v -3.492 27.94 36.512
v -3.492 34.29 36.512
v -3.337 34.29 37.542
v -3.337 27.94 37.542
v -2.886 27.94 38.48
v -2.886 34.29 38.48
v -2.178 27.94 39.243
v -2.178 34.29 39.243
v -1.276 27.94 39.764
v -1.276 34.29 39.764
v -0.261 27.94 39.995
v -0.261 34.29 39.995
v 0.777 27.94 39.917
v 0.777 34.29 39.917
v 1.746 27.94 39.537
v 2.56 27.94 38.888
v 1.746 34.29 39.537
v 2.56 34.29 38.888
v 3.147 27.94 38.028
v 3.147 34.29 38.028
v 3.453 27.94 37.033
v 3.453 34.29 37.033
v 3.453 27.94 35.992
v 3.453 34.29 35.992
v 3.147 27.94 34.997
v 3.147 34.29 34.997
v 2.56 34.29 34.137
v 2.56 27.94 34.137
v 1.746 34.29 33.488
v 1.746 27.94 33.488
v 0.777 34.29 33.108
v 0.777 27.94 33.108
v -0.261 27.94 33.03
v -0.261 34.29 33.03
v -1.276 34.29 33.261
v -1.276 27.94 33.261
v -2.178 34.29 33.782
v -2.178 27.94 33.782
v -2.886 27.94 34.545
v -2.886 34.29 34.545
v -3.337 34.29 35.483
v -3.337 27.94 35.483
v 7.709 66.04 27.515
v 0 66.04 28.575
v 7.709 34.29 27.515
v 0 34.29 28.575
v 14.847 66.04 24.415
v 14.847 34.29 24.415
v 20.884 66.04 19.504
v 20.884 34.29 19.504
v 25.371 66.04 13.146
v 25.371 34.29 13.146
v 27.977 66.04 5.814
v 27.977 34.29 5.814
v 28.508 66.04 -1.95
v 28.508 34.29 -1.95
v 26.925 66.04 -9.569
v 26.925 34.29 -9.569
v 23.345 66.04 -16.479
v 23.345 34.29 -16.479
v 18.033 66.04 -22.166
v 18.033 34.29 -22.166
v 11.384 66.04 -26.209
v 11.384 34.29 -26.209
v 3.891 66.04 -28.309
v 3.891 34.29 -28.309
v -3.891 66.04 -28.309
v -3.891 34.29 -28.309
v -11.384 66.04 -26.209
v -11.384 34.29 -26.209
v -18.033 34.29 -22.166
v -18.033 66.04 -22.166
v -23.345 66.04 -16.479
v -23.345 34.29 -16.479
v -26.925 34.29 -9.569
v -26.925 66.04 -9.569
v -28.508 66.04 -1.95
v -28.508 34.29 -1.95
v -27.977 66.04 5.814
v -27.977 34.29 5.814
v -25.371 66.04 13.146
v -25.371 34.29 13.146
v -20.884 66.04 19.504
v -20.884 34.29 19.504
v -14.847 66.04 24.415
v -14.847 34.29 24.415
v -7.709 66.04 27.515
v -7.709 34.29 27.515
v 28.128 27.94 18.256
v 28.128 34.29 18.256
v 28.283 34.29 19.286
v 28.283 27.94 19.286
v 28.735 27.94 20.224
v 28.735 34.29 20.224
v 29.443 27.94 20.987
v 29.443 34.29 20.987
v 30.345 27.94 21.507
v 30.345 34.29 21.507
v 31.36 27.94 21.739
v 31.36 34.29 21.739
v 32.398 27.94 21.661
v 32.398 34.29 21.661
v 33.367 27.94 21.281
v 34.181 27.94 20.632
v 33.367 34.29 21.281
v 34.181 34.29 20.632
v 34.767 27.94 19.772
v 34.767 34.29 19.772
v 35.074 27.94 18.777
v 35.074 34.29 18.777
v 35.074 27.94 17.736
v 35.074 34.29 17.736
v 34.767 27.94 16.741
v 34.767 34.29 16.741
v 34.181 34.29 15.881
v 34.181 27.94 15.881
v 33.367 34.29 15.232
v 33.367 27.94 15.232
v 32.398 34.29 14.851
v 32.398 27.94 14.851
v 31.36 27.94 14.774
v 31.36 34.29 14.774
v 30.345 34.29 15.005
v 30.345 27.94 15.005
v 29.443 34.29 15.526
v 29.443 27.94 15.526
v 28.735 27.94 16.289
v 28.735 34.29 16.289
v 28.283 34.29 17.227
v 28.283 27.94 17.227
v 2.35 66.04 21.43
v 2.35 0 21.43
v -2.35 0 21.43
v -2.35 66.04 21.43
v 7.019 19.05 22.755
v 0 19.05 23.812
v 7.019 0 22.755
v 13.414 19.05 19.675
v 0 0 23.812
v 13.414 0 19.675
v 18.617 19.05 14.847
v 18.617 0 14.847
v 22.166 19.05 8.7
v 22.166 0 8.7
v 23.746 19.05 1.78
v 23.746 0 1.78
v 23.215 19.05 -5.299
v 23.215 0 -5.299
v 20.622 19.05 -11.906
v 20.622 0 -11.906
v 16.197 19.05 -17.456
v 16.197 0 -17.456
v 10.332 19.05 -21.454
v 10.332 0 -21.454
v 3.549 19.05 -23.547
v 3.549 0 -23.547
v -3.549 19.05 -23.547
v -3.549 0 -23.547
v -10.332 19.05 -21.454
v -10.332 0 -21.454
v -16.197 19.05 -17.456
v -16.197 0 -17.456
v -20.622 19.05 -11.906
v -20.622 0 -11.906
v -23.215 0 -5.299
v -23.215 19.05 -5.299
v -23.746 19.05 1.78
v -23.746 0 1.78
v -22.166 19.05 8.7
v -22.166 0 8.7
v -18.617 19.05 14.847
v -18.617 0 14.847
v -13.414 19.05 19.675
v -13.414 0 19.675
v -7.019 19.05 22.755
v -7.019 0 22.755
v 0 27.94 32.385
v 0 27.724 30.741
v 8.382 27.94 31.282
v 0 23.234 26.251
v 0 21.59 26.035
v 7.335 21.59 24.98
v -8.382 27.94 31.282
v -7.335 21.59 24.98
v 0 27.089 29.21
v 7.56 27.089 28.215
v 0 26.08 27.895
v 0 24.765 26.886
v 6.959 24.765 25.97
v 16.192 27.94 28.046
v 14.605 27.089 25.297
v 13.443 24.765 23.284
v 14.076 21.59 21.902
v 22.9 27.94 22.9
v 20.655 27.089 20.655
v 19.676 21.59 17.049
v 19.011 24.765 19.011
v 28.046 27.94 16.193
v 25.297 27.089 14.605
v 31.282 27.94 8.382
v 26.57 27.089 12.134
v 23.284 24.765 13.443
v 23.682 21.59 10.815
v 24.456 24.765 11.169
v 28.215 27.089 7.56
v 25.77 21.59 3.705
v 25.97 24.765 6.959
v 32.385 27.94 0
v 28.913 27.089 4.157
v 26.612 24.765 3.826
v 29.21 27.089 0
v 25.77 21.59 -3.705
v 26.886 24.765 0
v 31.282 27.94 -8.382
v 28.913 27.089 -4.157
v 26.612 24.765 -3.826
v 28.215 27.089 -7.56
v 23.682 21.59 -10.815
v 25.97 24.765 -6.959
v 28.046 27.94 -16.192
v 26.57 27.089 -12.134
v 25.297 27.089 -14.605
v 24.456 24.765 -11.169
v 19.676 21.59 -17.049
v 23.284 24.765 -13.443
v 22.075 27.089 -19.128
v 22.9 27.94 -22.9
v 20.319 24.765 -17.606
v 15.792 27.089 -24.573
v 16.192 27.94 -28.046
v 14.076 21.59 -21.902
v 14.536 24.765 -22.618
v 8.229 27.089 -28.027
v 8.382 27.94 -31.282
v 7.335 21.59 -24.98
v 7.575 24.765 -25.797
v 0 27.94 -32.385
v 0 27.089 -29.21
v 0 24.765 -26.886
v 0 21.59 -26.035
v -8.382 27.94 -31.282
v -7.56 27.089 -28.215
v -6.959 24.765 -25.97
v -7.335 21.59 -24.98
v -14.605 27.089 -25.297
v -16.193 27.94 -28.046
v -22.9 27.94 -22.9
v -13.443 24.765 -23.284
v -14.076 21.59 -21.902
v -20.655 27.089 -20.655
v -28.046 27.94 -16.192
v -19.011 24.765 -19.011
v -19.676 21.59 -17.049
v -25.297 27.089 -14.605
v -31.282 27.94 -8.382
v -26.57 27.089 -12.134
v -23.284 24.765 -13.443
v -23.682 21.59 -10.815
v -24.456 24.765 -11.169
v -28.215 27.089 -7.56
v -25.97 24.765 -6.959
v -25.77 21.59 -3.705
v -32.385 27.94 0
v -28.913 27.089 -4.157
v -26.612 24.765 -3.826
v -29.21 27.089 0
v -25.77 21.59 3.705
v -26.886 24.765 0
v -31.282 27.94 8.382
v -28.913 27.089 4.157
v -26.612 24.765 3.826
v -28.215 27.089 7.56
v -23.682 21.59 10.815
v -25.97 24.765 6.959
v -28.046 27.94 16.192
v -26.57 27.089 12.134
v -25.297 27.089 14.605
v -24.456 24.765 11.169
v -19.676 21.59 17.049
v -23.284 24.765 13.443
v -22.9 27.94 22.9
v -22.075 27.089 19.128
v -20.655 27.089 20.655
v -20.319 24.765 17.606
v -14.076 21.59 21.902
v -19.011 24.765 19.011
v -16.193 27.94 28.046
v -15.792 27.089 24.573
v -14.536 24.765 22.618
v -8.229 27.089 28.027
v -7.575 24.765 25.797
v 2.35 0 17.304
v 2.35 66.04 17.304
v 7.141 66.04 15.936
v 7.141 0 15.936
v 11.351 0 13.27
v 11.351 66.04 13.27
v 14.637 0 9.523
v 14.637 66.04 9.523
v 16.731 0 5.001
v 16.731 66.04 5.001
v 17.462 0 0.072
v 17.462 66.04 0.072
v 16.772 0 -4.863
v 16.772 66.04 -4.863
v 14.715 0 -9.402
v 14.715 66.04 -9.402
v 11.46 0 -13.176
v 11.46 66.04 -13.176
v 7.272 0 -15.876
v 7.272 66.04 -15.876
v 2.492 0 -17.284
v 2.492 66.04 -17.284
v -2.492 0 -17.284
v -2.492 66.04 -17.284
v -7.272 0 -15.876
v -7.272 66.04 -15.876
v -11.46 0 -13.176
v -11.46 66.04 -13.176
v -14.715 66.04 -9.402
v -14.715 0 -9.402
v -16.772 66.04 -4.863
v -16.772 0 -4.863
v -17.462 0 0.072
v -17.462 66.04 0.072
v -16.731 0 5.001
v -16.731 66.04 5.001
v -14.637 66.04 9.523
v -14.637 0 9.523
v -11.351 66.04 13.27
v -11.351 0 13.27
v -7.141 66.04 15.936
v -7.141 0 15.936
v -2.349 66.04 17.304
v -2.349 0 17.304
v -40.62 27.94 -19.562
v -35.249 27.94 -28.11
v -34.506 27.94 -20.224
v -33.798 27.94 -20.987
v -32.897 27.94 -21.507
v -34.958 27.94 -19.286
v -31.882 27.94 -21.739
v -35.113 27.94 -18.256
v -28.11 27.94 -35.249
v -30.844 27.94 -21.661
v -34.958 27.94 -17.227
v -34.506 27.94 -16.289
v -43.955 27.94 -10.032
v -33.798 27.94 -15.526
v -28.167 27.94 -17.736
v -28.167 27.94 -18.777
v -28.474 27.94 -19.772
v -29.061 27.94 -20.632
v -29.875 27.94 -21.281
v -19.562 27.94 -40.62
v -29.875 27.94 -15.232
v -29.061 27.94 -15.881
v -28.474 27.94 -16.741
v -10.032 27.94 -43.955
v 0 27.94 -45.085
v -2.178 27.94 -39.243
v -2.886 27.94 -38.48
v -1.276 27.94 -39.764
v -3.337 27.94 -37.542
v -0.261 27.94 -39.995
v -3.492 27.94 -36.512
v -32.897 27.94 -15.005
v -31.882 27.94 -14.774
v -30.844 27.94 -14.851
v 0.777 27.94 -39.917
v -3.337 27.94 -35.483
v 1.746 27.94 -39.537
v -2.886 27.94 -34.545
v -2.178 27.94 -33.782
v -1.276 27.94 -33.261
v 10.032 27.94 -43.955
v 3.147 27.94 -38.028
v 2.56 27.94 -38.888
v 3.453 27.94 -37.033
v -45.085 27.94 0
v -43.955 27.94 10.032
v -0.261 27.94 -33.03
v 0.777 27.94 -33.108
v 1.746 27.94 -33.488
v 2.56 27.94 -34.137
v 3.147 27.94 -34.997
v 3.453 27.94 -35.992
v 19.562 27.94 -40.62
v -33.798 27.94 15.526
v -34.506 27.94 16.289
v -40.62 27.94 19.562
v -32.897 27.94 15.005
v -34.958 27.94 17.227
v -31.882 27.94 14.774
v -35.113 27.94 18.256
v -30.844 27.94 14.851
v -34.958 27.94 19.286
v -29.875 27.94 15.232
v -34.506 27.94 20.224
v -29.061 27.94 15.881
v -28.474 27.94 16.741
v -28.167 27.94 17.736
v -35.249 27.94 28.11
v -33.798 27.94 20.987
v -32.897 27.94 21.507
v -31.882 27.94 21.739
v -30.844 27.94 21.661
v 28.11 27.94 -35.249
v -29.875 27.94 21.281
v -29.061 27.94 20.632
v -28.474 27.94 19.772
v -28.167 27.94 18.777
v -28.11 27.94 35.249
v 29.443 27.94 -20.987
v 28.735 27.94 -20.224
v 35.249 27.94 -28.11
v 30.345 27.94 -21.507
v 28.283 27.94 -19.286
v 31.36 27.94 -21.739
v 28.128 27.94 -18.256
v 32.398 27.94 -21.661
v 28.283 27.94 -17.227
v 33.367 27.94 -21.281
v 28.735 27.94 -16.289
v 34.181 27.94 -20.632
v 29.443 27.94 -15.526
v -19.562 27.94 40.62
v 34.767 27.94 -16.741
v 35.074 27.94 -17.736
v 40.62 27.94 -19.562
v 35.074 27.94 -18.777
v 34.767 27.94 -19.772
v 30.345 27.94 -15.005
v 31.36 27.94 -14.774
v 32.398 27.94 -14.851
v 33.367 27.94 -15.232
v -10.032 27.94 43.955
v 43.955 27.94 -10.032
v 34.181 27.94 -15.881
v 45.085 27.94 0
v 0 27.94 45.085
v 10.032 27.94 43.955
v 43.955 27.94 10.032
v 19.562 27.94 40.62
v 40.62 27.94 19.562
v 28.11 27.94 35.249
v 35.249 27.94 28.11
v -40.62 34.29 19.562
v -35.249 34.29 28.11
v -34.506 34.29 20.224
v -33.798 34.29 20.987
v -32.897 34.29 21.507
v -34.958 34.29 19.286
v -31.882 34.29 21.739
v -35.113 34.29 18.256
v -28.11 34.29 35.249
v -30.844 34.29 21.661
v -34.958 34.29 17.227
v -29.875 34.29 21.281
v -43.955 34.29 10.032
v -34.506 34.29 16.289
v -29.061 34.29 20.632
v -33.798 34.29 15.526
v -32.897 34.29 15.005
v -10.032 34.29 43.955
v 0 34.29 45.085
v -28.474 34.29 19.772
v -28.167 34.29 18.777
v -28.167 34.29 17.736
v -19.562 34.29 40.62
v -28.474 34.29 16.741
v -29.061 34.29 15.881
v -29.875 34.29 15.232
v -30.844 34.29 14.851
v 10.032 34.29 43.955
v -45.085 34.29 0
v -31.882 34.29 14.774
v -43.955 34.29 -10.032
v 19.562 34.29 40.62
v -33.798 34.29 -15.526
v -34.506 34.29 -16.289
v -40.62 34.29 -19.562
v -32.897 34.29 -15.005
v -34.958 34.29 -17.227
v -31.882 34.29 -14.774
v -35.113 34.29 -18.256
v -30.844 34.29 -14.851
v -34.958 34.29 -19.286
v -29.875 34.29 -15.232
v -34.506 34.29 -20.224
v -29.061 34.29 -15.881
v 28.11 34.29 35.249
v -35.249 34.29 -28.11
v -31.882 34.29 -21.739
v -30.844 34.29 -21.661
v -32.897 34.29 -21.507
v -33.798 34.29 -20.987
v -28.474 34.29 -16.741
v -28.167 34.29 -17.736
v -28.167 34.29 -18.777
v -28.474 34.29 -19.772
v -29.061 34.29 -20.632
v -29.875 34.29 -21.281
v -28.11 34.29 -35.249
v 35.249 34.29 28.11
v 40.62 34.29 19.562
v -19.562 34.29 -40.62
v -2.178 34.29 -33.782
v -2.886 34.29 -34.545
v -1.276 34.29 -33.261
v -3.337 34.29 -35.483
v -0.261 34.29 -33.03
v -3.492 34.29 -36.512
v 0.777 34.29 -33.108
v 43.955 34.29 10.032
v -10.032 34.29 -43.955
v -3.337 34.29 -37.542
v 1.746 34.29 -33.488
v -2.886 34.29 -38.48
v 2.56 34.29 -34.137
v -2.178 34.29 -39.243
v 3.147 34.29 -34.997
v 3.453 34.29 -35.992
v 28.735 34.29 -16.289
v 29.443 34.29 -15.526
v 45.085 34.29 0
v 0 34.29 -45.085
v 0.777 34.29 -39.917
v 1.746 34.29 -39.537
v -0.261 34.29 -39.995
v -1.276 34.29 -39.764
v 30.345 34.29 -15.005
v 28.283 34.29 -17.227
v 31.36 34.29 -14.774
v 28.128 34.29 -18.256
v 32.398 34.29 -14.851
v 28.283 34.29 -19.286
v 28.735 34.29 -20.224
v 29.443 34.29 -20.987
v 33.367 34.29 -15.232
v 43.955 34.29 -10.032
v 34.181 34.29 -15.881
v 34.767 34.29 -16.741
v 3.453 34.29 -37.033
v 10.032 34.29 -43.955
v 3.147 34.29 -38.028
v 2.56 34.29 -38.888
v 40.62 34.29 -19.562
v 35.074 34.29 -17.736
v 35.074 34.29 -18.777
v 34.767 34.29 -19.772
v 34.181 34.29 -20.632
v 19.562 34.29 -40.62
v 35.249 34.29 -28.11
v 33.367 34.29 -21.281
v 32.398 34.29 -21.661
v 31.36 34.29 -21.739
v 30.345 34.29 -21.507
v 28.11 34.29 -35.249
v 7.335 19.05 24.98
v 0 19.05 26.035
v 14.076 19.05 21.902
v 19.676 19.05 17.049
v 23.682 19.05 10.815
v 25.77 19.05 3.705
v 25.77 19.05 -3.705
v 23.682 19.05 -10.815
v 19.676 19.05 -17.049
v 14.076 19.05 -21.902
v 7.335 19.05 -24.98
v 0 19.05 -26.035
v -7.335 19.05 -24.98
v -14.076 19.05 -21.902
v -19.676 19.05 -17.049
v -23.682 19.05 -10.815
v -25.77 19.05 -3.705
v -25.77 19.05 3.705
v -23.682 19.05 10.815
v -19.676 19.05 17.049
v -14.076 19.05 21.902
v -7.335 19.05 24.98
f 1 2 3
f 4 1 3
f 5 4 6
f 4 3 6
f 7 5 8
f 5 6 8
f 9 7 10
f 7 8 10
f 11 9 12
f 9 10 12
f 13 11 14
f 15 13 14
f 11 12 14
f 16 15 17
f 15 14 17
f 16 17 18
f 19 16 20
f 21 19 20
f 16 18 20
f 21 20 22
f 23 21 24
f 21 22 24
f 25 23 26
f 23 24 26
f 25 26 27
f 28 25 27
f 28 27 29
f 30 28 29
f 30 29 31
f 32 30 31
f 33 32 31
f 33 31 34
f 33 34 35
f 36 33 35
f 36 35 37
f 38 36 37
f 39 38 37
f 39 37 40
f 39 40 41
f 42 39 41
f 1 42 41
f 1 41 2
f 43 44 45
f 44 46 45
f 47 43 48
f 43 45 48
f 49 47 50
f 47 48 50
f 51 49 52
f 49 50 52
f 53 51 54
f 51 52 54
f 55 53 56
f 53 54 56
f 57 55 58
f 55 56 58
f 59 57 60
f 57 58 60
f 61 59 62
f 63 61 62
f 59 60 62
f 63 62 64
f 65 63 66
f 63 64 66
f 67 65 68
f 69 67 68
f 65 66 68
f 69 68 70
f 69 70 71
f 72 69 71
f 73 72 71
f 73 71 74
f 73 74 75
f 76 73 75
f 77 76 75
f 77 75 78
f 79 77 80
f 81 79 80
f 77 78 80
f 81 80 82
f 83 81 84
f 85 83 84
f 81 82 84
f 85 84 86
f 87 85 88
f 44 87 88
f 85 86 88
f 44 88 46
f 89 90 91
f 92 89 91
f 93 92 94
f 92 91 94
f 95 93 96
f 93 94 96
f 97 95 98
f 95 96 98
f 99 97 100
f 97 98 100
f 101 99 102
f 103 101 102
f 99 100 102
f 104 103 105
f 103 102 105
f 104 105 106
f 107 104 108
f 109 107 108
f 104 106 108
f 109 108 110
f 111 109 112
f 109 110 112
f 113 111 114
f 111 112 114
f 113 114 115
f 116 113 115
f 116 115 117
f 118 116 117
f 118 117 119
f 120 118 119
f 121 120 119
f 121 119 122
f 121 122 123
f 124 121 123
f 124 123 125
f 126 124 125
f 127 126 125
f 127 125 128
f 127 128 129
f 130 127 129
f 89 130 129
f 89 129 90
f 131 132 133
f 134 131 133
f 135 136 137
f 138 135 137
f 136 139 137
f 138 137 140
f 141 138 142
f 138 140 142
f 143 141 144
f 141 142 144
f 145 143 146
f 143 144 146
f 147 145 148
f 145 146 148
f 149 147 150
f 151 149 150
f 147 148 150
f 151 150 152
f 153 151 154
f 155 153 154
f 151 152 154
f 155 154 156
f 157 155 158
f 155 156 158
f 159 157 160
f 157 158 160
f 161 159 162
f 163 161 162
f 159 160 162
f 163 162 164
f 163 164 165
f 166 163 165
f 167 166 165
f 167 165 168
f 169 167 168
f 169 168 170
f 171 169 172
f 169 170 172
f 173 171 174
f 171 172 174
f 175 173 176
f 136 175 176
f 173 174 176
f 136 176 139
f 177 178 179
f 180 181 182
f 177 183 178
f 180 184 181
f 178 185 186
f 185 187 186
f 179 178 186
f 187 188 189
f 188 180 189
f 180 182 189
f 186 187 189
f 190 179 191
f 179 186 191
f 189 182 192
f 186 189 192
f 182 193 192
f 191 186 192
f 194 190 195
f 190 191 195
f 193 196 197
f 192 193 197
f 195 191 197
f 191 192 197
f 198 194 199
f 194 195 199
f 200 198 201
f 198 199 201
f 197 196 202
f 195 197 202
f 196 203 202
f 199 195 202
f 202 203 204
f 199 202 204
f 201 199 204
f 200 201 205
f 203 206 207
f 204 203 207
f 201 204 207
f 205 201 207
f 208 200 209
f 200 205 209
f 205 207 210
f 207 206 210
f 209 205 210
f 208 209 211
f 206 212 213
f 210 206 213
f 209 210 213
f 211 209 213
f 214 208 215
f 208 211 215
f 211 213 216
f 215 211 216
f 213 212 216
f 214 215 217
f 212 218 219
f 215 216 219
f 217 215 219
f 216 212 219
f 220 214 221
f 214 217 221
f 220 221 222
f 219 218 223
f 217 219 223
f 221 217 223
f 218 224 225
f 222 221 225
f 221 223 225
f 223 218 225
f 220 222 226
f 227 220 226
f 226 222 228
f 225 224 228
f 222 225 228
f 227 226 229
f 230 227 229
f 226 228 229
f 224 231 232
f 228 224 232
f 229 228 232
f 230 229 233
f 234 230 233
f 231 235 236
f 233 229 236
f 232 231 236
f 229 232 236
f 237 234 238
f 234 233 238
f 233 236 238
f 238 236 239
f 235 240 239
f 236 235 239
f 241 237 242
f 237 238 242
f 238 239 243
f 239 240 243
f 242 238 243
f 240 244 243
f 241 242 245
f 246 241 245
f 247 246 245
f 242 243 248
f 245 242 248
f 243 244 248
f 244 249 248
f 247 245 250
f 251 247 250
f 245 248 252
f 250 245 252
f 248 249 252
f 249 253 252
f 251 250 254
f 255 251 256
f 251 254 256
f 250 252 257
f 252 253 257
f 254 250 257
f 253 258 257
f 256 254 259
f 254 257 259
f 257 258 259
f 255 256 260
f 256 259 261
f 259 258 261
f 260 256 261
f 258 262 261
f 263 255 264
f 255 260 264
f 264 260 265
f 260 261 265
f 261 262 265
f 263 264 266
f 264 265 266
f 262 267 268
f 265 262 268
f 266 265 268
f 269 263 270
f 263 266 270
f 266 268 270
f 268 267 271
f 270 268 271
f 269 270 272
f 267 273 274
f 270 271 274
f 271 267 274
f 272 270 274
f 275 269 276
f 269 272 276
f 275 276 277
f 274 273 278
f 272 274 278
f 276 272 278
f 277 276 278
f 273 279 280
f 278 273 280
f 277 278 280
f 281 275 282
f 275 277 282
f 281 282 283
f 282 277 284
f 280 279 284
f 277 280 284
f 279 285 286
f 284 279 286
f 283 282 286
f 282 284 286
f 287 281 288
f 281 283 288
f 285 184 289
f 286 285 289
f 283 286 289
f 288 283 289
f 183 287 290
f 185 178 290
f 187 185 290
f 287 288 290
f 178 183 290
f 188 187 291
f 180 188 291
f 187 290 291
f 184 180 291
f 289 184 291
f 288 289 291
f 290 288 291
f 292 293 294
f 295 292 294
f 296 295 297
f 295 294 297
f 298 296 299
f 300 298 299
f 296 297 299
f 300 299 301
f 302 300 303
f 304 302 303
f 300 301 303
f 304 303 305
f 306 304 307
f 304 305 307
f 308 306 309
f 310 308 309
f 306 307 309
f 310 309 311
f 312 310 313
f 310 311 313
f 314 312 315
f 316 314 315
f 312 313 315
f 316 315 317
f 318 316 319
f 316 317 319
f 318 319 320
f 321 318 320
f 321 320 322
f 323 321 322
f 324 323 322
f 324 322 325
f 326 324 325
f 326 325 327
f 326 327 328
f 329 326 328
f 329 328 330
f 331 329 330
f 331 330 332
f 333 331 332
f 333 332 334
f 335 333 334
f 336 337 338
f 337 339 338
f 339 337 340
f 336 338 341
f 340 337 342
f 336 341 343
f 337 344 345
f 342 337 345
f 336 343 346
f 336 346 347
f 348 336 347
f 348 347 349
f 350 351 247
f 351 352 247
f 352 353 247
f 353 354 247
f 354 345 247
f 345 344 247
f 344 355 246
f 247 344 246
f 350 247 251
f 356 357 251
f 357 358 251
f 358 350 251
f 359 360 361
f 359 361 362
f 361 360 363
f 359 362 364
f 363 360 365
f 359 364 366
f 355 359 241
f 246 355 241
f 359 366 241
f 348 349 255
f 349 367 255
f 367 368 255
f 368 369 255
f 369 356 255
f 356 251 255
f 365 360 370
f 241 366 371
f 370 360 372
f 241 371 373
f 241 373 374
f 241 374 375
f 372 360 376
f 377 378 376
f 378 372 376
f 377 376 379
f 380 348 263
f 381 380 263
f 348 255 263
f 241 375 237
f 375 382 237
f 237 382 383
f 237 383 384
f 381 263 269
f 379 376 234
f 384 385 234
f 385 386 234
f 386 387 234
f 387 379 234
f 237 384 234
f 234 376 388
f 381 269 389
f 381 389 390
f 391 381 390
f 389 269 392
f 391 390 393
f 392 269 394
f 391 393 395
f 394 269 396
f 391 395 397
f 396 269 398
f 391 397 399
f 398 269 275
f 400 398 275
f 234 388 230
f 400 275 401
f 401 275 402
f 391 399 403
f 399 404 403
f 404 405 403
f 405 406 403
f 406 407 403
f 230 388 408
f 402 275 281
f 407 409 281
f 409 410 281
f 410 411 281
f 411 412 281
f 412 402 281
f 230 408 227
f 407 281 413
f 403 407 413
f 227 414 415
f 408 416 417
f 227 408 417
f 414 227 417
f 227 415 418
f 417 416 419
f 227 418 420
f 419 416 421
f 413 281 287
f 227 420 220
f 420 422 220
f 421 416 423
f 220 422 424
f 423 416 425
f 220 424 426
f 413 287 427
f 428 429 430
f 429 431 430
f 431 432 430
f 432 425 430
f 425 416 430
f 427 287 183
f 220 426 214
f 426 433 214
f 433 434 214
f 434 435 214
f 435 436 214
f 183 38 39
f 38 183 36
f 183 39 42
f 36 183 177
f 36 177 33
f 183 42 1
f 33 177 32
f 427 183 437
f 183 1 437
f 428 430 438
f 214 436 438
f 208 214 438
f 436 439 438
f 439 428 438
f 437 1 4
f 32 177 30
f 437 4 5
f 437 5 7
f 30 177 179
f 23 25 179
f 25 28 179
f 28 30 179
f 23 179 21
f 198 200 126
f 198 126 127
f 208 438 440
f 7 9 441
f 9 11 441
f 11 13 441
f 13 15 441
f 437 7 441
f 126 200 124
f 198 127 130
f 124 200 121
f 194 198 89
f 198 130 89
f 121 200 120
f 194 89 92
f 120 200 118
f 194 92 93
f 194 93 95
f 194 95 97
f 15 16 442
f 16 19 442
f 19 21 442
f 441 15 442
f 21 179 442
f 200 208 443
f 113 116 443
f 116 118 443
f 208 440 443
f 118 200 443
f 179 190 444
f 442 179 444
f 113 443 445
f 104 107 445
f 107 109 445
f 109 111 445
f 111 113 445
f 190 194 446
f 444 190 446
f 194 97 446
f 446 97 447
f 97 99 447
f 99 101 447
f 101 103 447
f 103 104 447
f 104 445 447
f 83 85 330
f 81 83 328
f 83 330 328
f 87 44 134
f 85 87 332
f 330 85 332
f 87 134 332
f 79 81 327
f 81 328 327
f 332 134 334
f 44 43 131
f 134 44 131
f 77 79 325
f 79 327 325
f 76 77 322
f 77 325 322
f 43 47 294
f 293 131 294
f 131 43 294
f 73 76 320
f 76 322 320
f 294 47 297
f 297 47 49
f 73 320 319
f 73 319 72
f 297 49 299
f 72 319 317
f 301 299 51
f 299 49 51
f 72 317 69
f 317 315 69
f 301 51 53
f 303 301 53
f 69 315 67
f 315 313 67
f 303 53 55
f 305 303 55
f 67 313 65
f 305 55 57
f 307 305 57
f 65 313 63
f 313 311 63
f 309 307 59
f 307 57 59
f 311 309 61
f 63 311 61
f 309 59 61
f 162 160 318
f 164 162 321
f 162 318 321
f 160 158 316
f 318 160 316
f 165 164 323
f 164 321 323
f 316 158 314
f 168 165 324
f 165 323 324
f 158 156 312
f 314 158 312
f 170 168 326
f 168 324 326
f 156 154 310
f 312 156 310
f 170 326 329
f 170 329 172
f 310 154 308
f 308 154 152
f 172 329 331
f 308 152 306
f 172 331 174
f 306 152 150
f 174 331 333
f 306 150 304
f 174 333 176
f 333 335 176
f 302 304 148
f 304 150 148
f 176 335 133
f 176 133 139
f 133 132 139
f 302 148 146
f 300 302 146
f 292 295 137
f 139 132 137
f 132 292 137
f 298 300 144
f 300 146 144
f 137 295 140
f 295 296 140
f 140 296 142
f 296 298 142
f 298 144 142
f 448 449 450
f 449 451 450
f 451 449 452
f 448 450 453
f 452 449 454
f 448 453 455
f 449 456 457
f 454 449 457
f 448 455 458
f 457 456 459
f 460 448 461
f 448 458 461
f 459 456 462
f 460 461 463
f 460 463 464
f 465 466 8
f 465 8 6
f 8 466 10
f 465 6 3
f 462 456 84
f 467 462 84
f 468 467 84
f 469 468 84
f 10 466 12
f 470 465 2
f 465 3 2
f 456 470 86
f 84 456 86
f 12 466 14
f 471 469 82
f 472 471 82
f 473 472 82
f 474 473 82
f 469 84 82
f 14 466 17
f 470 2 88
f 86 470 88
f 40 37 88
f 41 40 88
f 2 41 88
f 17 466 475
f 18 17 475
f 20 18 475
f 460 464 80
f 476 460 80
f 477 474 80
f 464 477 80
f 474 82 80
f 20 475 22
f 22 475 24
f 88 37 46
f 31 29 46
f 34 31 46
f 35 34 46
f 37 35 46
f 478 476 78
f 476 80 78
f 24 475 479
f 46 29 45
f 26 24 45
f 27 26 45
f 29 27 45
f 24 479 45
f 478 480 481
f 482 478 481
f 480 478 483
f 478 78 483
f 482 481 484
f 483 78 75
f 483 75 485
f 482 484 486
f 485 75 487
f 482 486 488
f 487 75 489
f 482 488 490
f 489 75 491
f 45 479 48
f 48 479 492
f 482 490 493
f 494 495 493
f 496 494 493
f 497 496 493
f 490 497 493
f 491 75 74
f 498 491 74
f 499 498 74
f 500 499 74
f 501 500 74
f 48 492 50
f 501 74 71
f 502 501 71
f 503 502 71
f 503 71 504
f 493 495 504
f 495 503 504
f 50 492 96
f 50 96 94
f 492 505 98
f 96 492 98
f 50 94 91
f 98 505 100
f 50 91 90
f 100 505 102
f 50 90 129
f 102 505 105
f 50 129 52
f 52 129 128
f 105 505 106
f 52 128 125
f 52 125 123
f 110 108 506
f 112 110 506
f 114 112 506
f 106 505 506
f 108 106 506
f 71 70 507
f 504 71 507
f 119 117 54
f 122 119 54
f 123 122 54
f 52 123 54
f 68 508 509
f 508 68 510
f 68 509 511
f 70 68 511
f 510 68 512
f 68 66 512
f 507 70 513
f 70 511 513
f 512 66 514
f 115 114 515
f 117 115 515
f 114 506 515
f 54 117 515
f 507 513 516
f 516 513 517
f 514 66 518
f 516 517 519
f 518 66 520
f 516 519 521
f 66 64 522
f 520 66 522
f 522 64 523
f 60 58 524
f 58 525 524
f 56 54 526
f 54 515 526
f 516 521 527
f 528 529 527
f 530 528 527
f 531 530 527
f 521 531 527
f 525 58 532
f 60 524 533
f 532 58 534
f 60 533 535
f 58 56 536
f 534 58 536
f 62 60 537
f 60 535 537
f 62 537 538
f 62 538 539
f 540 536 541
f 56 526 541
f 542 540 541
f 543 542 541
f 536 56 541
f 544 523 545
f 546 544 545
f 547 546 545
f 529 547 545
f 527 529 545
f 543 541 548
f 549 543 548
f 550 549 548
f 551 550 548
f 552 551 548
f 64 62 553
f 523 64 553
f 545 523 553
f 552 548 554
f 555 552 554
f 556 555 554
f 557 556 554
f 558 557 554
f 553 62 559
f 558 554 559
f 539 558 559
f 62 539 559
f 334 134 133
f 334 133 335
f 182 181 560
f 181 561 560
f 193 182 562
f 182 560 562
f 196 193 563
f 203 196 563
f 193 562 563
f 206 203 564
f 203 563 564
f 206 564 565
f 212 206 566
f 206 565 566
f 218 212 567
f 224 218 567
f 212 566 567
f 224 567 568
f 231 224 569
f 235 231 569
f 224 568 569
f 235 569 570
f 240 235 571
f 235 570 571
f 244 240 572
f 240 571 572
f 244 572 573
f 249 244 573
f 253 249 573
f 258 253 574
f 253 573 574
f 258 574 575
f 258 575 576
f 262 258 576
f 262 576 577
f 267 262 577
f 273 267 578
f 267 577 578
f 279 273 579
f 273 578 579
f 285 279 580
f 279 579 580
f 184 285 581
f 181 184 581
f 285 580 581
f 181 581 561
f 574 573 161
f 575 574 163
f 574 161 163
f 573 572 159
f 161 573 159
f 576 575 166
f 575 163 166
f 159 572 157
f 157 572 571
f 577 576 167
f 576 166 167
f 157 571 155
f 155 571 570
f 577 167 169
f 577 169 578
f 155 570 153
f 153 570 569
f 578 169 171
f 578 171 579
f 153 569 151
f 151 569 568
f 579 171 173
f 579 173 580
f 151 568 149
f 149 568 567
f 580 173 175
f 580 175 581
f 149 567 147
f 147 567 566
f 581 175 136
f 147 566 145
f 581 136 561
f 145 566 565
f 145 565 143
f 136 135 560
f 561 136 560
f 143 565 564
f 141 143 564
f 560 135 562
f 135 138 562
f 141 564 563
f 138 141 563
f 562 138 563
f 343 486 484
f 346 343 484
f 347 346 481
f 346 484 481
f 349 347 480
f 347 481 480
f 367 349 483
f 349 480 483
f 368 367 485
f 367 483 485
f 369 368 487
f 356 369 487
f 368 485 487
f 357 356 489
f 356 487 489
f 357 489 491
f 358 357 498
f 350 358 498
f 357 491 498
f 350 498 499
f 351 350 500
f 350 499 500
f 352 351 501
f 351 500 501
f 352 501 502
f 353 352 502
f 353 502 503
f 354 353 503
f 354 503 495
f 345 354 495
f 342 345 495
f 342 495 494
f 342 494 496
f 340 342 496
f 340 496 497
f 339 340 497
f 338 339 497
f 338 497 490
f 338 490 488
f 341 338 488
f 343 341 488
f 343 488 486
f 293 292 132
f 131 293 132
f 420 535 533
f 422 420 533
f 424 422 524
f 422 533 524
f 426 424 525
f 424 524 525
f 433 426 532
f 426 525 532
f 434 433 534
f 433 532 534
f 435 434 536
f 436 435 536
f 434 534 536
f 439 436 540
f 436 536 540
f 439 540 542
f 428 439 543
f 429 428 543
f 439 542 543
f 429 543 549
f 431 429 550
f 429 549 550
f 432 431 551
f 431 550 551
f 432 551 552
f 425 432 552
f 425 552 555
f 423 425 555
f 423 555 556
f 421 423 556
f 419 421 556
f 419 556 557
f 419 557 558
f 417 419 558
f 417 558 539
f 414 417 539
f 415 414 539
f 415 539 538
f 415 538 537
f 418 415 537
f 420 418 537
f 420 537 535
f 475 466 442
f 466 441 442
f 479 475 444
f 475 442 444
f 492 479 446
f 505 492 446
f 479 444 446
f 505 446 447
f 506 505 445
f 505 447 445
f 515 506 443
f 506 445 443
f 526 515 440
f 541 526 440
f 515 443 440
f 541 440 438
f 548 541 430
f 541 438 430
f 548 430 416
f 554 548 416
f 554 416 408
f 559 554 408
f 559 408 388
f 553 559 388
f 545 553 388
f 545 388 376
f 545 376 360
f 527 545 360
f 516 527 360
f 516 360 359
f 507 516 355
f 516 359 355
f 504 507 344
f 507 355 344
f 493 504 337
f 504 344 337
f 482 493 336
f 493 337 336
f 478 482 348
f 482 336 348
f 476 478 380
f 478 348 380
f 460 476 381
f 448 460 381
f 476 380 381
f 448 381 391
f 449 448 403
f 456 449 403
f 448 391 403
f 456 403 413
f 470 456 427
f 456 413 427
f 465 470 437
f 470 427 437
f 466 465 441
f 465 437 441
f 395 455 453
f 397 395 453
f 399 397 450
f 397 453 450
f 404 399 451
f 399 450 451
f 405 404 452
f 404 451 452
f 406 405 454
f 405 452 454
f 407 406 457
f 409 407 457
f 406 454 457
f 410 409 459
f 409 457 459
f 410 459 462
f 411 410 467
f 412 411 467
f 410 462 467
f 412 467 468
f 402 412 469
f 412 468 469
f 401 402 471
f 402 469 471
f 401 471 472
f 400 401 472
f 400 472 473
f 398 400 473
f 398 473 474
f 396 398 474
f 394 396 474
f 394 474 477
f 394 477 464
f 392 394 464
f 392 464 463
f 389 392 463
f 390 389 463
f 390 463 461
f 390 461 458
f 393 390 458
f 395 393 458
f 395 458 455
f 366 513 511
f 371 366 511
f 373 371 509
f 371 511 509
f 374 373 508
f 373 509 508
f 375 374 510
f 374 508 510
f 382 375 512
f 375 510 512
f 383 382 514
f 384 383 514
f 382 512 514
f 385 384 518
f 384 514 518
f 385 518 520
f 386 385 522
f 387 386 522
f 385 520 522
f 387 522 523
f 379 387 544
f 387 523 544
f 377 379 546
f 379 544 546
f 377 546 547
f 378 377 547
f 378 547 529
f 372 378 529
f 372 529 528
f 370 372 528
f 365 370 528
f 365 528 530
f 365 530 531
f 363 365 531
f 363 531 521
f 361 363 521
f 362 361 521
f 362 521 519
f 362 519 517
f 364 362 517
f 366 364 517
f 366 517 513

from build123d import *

# Parameters (mm, degrees)
F4_D     = 34.925
F6_D     = 6.985
F8_DEPTH = 66.04


with BuildPart() as f2:
    # F0 (on Right) → F2 (revolve)
    with BuildSketch(Plane.YZ):
        with BuildLine():
            Line((0, 23.8125), (0, 0))
            Line((0, 0), (66.04, 0))
            Line((66.04, 0), (66.04, 28.575))
            Line((66.04, 28.575), (34.29, 28.575))
            Line((34.29, 28.575), (34.29, 45.085))
            Line((34.29, 45.085), (27.94, 45.085))
            Line((27.94, 45.085), (27.94, 32.385))
            ThreePointArc((27.94, 32.385), (26.080128, 27.894872), (21.59, 26.035))
            Line((21.59, 26.035), (19.05, 26.035))
            Line((19.05, 26.035), (19.05, 23.8125))
            Line((19.05, 23.8125), (0, 23.8125))
        make_face()
    revolve(axis=Axis((0, 38.1, 0), (0, 1, 0)))

    # F4 (through all)
    with Locations(Plane.XZ):
        with Locations((0, 0)):
            Hole(F4_D / 2)

    # F6 (through all)
    with Locations(Plane.XZ.offset(-27.94)):
        with Locations((0, 36.5125), (31.620753, 18.25625), (31.620753, -18.25625), (0, -36.5125), (-31.620753, -18.25625), (-31.620753, 18.25625)):
            Hole(F6_D / 2)

    # F7 (on Front) → F8 (cut)
    with BuildSketch(Plane.XZ):
        Polygon((2.3495, 21.429623), (0, 21.429623), (-2.3495, 21.429623), (-2.3495, 16.803641), (0, 16.803641), (2.3495, 16.803641), align=None)
    extrude(amount=-F8_DEPTH, mode=Mode.SUBTRACT)


solid = f2.part
